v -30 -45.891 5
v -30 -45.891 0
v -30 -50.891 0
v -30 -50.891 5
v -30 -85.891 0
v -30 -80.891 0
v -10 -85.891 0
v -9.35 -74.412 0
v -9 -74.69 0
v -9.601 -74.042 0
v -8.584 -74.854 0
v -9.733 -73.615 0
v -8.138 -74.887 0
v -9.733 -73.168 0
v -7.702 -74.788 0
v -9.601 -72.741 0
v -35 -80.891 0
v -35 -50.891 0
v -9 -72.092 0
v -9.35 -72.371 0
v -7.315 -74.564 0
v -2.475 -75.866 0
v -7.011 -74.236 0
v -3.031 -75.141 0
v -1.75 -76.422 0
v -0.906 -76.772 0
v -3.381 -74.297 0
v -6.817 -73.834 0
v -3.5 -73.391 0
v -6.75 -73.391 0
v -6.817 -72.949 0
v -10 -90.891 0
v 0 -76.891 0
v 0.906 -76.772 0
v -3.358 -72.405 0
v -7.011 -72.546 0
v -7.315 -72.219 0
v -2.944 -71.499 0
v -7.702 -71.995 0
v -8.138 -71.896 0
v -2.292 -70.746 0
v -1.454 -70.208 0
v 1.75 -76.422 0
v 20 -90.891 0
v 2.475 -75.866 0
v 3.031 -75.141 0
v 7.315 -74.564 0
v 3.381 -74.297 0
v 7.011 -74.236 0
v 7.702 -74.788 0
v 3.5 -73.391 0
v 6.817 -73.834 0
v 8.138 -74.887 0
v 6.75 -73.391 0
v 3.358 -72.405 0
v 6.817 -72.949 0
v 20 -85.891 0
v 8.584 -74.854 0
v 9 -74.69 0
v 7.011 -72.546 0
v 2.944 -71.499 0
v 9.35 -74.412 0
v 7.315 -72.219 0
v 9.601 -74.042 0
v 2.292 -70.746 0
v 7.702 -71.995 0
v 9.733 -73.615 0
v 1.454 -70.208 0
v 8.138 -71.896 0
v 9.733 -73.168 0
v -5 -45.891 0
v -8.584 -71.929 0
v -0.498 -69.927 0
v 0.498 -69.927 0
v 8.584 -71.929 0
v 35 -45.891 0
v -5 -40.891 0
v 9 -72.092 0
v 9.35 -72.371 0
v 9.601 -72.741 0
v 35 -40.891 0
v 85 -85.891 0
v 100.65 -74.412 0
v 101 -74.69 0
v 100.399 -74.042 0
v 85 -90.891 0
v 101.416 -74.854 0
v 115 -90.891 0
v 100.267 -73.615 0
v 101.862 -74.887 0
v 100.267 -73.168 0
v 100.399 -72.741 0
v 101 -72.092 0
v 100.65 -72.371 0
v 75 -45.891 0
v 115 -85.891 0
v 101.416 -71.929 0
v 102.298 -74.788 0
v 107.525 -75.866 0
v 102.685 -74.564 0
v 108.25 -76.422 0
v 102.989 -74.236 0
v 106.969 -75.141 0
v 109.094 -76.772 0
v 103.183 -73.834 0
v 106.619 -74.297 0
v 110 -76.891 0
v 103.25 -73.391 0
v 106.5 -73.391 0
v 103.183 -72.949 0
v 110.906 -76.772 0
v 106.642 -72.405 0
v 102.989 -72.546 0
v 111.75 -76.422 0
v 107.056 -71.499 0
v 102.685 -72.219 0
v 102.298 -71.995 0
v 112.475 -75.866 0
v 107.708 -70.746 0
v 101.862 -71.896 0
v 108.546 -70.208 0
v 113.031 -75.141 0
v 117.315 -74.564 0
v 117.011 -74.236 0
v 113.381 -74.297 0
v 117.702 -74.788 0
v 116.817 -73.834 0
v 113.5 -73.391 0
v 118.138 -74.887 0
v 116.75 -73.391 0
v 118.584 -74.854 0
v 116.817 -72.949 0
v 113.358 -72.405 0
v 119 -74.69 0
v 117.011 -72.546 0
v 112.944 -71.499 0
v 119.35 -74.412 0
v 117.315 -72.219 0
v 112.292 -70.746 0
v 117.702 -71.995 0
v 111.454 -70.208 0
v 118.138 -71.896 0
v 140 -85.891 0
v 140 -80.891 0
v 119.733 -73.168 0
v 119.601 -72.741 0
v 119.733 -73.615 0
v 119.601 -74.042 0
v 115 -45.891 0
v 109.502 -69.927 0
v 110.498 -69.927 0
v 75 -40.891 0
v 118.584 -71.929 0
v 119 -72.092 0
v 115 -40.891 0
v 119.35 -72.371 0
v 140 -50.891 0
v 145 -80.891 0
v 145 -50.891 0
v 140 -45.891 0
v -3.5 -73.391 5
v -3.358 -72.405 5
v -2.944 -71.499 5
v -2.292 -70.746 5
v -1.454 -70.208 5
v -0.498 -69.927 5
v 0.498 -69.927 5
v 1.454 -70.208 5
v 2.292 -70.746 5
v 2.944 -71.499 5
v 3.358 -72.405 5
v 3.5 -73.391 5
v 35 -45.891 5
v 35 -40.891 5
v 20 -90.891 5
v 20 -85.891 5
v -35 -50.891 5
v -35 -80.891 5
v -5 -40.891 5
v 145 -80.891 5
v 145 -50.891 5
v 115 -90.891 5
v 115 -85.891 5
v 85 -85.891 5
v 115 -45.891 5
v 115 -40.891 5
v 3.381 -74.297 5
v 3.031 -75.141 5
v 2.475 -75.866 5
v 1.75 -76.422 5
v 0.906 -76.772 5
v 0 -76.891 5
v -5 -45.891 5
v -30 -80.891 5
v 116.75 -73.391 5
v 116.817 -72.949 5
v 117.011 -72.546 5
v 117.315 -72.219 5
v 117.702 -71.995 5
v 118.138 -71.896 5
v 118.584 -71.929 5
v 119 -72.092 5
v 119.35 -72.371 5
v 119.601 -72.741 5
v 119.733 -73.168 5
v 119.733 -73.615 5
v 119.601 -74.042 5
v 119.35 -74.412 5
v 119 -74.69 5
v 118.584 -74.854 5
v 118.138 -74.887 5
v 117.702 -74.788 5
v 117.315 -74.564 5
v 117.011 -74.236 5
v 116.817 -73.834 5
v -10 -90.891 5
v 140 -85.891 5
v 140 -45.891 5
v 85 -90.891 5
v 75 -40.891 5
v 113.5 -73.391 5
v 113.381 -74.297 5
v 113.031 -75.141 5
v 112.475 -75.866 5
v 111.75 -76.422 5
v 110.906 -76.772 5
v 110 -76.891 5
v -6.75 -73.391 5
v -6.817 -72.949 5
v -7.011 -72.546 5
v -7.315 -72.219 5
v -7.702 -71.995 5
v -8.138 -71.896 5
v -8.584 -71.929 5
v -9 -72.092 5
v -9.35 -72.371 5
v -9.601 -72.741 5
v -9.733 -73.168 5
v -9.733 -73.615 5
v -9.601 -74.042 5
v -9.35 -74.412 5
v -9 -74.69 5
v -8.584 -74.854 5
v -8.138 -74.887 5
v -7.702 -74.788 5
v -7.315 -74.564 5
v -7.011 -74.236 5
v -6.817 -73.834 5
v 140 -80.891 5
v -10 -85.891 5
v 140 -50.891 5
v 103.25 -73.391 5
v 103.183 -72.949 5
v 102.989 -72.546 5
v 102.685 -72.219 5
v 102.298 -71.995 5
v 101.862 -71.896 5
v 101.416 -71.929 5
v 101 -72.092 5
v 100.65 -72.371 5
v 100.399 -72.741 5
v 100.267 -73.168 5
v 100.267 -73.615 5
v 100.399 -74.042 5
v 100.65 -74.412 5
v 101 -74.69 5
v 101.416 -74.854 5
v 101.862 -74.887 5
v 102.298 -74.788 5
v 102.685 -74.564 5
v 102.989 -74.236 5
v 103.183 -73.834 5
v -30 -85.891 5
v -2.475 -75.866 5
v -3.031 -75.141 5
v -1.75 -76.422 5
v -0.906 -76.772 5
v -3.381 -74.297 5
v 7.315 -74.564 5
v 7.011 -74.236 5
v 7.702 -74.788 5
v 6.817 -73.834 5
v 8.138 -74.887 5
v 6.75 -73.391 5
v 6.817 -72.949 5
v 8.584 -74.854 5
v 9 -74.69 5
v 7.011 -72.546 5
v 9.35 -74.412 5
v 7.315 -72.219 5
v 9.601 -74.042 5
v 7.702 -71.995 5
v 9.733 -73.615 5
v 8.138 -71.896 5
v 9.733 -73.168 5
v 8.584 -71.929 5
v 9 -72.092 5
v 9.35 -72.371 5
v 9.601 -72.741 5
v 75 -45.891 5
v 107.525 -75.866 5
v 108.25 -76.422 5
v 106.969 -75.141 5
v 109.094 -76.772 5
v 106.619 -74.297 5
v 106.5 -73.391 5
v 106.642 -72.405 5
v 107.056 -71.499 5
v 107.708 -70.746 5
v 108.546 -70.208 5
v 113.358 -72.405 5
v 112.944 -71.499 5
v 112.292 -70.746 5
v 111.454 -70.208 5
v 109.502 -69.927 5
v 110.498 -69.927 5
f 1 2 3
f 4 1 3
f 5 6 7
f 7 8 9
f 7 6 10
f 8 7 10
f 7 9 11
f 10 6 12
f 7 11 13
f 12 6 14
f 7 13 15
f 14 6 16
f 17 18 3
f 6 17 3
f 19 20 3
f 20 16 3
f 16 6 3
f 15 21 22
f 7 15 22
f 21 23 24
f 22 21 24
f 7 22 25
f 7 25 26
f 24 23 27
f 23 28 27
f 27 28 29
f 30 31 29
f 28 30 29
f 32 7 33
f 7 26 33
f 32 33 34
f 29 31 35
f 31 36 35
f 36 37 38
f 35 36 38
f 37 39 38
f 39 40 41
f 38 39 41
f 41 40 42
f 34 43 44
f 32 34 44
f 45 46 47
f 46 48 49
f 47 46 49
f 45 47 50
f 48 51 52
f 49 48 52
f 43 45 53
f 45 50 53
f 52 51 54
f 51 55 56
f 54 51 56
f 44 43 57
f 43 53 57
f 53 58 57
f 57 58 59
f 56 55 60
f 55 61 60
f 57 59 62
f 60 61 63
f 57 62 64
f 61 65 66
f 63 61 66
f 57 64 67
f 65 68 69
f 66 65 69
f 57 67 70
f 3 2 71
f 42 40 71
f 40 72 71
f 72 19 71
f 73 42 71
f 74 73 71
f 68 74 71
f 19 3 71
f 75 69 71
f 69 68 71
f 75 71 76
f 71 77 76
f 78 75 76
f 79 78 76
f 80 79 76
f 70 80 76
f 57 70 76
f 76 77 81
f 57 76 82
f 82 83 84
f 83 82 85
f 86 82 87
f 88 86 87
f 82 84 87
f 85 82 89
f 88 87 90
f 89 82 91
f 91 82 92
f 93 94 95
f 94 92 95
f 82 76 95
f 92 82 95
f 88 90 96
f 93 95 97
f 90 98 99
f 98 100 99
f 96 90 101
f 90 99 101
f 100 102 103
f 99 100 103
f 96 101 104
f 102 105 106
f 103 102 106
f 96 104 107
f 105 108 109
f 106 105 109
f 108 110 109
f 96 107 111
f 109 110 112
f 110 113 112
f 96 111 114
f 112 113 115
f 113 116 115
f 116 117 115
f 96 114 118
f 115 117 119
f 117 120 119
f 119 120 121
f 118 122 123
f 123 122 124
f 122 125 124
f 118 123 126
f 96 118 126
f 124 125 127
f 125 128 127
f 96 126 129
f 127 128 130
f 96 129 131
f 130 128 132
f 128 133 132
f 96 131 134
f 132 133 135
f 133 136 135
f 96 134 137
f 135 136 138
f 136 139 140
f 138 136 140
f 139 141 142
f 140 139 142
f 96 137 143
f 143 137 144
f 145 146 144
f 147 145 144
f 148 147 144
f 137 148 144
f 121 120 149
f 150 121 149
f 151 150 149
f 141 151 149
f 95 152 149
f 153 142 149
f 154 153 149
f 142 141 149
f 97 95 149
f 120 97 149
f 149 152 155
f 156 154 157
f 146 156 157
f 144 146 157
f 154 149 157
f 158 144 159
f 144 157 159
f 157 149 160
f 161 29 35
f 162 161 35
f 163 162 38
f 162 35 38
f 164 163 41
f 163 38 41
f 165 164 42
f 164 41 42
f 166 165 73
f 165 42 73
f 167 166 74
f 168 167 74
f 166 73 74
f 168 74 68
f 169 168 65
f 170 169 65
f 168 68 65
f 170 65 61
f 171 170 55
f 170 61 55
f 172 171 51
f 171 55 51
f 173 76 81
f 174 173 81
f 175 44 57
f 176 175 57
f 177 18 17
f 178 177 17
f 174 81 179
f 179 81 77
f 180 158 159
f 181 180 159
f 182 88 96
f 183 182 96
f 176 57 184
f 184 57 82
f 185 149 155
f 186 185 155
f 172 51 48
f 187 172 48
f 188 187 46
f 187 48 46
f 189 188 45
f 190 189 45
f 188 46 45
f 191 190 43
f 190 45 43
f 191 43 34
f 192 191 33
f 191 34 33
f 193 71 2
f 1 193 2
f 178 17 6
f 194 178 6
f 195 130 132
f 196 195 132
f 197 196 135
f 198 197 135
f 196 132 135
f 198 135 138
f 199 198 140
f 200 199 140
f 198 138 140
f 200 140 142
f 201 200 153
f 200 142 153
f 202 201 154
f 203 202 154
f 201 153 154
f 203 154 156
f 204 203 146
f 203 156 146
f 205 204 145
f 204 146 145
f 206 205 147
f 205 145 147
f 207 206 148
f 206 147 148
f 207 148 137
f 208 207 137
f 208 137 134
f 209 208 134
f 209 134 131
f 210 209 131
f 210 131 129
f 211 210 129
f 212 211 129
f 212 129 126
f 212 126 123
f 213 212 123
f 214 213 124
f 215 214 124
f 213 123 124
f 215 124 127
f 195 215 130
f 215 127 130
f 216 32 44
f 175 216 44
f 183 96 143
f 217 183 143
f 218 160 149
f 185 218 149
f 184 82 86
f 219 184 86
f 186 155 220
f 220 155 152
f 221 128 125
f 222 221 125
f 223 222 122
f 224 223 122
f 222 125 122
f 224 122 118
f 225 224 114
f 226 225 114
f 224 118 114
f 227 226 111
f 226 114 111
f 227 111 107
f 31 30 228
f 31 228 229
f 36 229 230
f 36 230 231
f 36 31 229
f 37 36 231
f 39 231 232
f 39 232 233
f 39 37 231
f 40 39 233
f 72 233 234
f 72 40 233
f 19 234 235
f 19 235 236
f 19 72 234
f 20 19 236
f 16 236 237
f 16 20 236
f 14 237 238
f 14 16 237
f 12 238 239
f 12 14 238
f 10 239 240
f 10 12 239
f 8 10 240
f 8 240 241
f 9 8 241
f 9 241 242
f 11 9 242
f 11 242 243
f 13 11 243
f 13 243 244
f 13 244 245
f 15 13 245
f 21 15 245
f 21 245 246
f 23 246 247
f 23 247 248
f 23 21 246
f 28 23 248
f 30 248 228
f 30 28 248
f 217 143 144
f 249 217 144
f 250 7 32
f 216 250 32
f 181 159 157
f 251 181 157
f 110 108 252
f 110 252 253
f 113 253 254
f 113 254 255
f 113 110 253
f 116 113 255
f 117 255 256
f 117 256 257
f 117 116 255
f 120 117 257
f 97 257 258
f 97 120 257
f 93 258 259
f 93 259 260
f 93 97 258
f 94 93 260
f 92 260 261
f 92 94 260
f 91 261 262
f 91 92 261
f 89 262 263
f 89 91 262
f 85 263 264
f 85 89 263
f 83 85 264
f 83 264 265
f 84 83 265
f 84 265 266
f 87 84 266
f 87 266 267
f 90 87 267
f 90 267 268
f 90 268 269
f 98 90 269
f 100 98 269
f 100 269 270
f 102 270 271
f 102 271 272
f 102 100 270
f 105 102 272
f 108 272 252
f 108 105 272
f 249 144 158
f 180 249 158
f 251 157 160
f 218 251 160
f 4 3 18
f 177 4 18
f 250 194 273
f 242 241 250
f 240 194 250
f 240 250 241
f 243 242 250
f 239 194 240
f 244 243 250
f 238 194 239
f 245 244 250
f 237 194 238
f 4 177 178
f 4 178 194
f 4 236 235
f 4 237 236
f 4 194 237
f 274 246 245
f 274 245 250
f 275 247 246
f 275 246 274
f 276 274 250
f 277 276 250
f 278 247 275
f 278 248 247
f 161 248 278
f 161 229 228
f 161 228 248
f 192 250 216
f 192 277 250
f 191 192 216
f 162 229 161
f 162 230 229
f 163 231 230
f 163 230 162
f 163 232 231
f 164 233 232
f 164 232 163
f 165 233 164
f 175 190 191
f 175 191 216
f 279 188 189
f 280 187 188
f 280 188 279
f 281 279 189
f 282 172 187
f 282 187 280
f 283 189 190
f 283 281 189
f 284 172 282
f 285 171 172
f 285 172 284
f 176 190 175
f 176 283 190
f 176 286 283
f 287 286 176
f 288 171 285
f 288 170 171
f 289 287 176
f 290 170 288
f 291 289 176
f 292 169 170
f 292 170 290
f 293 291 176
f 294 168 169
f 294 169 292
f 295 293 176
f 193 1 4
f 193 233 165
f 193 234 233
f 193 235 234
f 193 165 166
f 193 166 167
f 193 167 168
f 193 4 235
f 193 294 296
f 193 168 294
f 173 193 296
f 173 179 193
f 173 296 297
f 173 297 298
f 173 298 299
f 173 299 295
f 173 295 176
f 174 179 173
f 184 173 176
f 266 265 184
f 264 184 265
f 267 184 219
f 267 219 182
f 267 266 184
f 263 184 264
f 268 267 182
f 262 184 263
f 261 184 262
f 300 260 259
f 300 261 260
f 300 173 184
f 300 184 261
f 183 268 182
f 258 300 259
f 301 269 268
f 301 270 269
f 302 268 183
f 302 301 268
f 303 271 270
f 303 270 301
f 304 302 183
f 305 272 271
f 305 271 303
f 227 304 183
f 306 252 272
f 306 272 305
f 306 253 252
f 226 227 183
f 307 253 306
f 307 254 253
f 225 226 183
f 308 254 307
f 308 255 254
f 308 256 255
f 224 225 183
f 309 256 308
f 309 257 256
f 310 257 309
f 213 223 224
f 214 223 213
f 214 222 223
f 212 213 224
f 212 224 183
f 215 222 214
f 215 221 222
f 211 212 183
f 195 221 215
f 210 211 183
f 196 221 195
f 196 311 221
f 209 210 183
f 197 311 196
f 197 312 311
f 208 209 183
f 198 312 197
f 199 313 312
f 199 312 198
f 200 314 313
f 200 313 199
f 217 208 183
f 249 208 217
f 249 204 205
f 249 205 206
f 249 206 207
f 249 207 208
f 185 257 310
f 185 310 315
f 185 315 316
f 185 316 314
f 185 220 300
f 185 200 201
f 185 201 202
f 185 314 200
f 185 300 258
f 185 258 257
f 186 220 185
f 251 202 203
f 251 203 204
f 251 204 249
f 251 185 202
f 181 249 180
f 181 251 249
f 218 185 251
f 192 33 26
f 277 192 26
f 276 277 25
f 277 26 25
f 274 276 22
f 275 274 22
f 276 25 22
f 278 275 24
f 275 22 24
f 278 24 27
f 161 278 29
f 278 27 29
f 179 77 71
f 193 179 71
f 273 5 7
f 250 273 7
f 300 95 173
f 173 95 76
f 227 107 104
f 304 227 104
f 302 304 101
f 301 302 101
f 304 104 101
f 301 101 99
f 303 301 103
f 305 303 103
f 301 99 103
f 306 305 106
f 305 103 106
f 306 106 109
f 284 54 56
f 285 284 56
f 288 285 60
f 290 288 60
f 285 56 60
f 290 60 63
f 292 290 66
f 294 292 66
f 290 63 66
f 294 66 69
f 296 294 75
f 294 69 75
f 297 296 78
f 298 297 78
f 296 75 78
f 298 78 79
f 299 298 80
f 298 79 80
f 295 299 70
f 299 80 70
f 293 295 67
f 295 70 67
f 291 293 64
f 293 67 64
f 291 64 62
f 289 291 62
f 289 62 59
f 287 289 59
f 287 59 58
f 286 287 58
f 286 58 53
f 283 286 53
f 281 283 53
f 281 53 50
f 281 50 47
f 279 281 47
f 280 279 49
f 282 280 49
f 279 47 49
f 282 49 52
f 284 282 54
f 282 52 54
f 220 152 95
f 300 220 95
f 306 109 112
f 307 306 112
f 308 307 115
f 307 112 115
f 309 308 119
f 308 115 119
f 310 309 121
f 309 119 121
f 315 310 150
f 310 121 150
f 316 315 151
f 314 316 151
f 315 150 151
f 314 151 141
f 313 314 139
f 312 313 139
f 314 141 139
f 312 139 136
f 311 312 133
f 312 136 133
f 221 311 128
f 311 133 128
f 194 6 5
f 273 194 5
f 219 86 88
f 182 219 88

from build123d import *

# Parameters (mm, degrees)
SKETCH1_R           = 1.5
BOSS_EXTRUDE1_DEPTH = 5


with BuildPart() as part:
    # Sketch1 → Boss-Extrude1 (new body)
    # profile 1 of 2: a face of its own
    with BuildSketch(Plane.XY):
        Polygon((-30, -45.891400943), (-30, -50.891400943), (-35, -50.891400943), (-35, -80.891400943), (-30, -80.891400943), (-30, -85.891400943), (-14, -85.891400943), (-10, -85.891400943), (-10, -90.891400943), (20, -90.891400943), (20, -85.891400943), (85, -85.891400943), (110, -85.891400943), (115, -85.891400943), (140, -85.891400943), (140, -80.891400943), (145, -80.891400943), (145, -50.891400943), (140, -50.891400943), (140, -45.891400943), (115, -45.891400943), (115, -40.891400943), (75, -40.891400943), (75, -45.891400943), (35, -45.891400943), (35, -40.891400943), (-5, -40.891400943), (-5, -45.891400943), align=None)
        with Locations((-8.25, -73.391400943)):
            Circle(SKETCH1_R, mode=Mode.SUBTRACT)
        with BuildLine():
            ThreePointArc((3.5, -73.391400943), (2.474873734, -75.866274677), (0, -76.891400943))
            ThreePointArc((0, -76.891400943), (-2.474873734, -75.866274677), (-3.5, -73.391400943))
            ThreePointArc((-3.5, -73.391400943), (0, -69.891400943), (3.5, -73.391400943))
        make_face(mode=Mode.SUBTRACT)
        with BuildLine():
            ThreePointArc((9.75, -73.391400943), (8.25, -74.891400943), (6.75, -73.391400943))
            ThreePointArc((6.75, -73.391400943), (8.25, -71.891400943), (9.75, -73.391400943))
        make_face(mode=Mode.SUBTRACT)
        with Locations((101.75, -73.391400943)):
            Circle(SKETCH1_R, mode=Mode.SUBTRACT)
        with BuildLine():
            ThreePointArc((113.5, -73.391400943), (112.474873734, -75.866274677), (110, -76.891400943))
            ThreePointArc((110, -76.891400943), (107.525126266, -75.866274677), (106.5, -73.391400943))
            ThreePointArc((106.5, -73.391400943), (110, -69.891400943), (113.5, -73.391400943))
        make_face(mode=Mode.SUBTRACT)
        with BuildLine():
            ThreePointArc((119.75, -73.391400943), (118.25, -74.891400943), (116.75, -73.391400943))
            ThreePointArc((116.75, -73.391400943), (118.25, -71.891400943), (119.75, -73.391400943))
        make_face(mode=Mode.SUBTRACT)
    # profile 2 of 2: a face of its own
    with BuildSketch(Plane.XY):
        Polygon((110, -85.891400943), (85, -85.891400943), (85, -90.891400943), (115, -90.891400943), (115, -85.891400943), align=None)
    extrude(amount=BOSS_EXTRUDE1_DEPTH)


solid = part.part
